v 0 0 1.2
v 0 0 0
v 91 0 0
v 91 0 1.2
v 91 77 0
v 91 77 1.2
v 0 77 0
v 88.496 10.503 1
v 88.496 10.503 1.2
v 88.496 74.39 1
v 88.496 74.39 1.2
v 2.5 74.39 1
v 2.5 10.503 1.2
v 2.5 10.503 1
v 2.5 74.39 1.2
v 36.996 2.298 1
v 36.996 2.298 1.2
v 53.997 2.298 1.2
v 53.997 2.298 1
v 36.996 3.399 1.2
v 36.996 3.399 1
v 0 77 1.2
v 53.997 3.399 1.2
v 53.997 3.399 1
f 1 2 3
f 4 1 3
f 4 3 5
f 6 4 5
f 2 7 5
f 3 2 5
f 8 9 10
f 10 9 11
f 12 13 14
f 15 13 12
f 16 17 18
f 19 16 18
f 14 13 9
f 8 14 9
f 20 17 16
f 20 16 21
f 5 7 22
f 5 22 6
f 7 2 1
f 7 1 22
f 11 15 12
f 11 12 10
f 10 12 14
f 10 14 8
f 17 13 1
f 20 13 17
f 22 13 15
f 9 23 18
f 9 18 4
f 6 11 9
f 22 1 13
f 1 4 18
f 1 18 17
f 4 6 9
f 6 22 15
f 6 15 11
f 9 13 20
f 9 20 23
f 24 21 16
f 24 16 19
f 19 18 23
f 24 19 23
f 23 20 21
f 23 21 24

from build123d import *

# Parameters (mm, degrees)
ESQUISSE1_W             = 91
ESQUISSE1_H             = 77
BOSS_EXTRU_1_DEPTH      = 1.2
ESQUISSE2_W             = 85.996652656
ESQUISSE2_H             = 63.887239855
ENL_V_MAT_EXTRU_1_DEPTH = 0.2
ESQUISSE3_W             = 17.000934191
ESQUISSE3_H             = 1.101570178
ENL_V_MAT_EXTRU_2_DEPTH = 0.2


with BuildPart() as part:
    # Esquisse1 → Boss.-Extru.1 (new body)
    with BuildSketch(Plane.XY):
        with Locations((45.5, 38.5)):
            Rectangle(ESQUISSE1_W, ESQUISSE1_H)
    extrude(amount=BOSS_EXTRU_1_DEPTH)

    # Esquisse2 → Enlèv. mat.-Extru.1 (cut)
    with BuildSketch(Plane.XY.offset(1.2)):
        with Locations((45.498164964, 42.446254928)):
            Rectangle(ESQUISSE2_W, ESQUISSE2_H)
    extrude(amount=-ENL_V_MAT_EXTRU_1_DEPTH, mode=Mode.SUBTRACT)

    # Esquisse3 → Enlèv. mat.-Extru.2 (cut)
    with BuildSketch(Plane.XY.offset(1.2)):
        with Locations((45.496546397, 2.848297653)):
            Rectangle(ESQUISSE3_W, ESQUISSE3_H)
    extrude(amount=-ENL_V_MAT_EXTRU_2_DEPTH, mode=Mode.SUBTRACT)


solid = part.part
